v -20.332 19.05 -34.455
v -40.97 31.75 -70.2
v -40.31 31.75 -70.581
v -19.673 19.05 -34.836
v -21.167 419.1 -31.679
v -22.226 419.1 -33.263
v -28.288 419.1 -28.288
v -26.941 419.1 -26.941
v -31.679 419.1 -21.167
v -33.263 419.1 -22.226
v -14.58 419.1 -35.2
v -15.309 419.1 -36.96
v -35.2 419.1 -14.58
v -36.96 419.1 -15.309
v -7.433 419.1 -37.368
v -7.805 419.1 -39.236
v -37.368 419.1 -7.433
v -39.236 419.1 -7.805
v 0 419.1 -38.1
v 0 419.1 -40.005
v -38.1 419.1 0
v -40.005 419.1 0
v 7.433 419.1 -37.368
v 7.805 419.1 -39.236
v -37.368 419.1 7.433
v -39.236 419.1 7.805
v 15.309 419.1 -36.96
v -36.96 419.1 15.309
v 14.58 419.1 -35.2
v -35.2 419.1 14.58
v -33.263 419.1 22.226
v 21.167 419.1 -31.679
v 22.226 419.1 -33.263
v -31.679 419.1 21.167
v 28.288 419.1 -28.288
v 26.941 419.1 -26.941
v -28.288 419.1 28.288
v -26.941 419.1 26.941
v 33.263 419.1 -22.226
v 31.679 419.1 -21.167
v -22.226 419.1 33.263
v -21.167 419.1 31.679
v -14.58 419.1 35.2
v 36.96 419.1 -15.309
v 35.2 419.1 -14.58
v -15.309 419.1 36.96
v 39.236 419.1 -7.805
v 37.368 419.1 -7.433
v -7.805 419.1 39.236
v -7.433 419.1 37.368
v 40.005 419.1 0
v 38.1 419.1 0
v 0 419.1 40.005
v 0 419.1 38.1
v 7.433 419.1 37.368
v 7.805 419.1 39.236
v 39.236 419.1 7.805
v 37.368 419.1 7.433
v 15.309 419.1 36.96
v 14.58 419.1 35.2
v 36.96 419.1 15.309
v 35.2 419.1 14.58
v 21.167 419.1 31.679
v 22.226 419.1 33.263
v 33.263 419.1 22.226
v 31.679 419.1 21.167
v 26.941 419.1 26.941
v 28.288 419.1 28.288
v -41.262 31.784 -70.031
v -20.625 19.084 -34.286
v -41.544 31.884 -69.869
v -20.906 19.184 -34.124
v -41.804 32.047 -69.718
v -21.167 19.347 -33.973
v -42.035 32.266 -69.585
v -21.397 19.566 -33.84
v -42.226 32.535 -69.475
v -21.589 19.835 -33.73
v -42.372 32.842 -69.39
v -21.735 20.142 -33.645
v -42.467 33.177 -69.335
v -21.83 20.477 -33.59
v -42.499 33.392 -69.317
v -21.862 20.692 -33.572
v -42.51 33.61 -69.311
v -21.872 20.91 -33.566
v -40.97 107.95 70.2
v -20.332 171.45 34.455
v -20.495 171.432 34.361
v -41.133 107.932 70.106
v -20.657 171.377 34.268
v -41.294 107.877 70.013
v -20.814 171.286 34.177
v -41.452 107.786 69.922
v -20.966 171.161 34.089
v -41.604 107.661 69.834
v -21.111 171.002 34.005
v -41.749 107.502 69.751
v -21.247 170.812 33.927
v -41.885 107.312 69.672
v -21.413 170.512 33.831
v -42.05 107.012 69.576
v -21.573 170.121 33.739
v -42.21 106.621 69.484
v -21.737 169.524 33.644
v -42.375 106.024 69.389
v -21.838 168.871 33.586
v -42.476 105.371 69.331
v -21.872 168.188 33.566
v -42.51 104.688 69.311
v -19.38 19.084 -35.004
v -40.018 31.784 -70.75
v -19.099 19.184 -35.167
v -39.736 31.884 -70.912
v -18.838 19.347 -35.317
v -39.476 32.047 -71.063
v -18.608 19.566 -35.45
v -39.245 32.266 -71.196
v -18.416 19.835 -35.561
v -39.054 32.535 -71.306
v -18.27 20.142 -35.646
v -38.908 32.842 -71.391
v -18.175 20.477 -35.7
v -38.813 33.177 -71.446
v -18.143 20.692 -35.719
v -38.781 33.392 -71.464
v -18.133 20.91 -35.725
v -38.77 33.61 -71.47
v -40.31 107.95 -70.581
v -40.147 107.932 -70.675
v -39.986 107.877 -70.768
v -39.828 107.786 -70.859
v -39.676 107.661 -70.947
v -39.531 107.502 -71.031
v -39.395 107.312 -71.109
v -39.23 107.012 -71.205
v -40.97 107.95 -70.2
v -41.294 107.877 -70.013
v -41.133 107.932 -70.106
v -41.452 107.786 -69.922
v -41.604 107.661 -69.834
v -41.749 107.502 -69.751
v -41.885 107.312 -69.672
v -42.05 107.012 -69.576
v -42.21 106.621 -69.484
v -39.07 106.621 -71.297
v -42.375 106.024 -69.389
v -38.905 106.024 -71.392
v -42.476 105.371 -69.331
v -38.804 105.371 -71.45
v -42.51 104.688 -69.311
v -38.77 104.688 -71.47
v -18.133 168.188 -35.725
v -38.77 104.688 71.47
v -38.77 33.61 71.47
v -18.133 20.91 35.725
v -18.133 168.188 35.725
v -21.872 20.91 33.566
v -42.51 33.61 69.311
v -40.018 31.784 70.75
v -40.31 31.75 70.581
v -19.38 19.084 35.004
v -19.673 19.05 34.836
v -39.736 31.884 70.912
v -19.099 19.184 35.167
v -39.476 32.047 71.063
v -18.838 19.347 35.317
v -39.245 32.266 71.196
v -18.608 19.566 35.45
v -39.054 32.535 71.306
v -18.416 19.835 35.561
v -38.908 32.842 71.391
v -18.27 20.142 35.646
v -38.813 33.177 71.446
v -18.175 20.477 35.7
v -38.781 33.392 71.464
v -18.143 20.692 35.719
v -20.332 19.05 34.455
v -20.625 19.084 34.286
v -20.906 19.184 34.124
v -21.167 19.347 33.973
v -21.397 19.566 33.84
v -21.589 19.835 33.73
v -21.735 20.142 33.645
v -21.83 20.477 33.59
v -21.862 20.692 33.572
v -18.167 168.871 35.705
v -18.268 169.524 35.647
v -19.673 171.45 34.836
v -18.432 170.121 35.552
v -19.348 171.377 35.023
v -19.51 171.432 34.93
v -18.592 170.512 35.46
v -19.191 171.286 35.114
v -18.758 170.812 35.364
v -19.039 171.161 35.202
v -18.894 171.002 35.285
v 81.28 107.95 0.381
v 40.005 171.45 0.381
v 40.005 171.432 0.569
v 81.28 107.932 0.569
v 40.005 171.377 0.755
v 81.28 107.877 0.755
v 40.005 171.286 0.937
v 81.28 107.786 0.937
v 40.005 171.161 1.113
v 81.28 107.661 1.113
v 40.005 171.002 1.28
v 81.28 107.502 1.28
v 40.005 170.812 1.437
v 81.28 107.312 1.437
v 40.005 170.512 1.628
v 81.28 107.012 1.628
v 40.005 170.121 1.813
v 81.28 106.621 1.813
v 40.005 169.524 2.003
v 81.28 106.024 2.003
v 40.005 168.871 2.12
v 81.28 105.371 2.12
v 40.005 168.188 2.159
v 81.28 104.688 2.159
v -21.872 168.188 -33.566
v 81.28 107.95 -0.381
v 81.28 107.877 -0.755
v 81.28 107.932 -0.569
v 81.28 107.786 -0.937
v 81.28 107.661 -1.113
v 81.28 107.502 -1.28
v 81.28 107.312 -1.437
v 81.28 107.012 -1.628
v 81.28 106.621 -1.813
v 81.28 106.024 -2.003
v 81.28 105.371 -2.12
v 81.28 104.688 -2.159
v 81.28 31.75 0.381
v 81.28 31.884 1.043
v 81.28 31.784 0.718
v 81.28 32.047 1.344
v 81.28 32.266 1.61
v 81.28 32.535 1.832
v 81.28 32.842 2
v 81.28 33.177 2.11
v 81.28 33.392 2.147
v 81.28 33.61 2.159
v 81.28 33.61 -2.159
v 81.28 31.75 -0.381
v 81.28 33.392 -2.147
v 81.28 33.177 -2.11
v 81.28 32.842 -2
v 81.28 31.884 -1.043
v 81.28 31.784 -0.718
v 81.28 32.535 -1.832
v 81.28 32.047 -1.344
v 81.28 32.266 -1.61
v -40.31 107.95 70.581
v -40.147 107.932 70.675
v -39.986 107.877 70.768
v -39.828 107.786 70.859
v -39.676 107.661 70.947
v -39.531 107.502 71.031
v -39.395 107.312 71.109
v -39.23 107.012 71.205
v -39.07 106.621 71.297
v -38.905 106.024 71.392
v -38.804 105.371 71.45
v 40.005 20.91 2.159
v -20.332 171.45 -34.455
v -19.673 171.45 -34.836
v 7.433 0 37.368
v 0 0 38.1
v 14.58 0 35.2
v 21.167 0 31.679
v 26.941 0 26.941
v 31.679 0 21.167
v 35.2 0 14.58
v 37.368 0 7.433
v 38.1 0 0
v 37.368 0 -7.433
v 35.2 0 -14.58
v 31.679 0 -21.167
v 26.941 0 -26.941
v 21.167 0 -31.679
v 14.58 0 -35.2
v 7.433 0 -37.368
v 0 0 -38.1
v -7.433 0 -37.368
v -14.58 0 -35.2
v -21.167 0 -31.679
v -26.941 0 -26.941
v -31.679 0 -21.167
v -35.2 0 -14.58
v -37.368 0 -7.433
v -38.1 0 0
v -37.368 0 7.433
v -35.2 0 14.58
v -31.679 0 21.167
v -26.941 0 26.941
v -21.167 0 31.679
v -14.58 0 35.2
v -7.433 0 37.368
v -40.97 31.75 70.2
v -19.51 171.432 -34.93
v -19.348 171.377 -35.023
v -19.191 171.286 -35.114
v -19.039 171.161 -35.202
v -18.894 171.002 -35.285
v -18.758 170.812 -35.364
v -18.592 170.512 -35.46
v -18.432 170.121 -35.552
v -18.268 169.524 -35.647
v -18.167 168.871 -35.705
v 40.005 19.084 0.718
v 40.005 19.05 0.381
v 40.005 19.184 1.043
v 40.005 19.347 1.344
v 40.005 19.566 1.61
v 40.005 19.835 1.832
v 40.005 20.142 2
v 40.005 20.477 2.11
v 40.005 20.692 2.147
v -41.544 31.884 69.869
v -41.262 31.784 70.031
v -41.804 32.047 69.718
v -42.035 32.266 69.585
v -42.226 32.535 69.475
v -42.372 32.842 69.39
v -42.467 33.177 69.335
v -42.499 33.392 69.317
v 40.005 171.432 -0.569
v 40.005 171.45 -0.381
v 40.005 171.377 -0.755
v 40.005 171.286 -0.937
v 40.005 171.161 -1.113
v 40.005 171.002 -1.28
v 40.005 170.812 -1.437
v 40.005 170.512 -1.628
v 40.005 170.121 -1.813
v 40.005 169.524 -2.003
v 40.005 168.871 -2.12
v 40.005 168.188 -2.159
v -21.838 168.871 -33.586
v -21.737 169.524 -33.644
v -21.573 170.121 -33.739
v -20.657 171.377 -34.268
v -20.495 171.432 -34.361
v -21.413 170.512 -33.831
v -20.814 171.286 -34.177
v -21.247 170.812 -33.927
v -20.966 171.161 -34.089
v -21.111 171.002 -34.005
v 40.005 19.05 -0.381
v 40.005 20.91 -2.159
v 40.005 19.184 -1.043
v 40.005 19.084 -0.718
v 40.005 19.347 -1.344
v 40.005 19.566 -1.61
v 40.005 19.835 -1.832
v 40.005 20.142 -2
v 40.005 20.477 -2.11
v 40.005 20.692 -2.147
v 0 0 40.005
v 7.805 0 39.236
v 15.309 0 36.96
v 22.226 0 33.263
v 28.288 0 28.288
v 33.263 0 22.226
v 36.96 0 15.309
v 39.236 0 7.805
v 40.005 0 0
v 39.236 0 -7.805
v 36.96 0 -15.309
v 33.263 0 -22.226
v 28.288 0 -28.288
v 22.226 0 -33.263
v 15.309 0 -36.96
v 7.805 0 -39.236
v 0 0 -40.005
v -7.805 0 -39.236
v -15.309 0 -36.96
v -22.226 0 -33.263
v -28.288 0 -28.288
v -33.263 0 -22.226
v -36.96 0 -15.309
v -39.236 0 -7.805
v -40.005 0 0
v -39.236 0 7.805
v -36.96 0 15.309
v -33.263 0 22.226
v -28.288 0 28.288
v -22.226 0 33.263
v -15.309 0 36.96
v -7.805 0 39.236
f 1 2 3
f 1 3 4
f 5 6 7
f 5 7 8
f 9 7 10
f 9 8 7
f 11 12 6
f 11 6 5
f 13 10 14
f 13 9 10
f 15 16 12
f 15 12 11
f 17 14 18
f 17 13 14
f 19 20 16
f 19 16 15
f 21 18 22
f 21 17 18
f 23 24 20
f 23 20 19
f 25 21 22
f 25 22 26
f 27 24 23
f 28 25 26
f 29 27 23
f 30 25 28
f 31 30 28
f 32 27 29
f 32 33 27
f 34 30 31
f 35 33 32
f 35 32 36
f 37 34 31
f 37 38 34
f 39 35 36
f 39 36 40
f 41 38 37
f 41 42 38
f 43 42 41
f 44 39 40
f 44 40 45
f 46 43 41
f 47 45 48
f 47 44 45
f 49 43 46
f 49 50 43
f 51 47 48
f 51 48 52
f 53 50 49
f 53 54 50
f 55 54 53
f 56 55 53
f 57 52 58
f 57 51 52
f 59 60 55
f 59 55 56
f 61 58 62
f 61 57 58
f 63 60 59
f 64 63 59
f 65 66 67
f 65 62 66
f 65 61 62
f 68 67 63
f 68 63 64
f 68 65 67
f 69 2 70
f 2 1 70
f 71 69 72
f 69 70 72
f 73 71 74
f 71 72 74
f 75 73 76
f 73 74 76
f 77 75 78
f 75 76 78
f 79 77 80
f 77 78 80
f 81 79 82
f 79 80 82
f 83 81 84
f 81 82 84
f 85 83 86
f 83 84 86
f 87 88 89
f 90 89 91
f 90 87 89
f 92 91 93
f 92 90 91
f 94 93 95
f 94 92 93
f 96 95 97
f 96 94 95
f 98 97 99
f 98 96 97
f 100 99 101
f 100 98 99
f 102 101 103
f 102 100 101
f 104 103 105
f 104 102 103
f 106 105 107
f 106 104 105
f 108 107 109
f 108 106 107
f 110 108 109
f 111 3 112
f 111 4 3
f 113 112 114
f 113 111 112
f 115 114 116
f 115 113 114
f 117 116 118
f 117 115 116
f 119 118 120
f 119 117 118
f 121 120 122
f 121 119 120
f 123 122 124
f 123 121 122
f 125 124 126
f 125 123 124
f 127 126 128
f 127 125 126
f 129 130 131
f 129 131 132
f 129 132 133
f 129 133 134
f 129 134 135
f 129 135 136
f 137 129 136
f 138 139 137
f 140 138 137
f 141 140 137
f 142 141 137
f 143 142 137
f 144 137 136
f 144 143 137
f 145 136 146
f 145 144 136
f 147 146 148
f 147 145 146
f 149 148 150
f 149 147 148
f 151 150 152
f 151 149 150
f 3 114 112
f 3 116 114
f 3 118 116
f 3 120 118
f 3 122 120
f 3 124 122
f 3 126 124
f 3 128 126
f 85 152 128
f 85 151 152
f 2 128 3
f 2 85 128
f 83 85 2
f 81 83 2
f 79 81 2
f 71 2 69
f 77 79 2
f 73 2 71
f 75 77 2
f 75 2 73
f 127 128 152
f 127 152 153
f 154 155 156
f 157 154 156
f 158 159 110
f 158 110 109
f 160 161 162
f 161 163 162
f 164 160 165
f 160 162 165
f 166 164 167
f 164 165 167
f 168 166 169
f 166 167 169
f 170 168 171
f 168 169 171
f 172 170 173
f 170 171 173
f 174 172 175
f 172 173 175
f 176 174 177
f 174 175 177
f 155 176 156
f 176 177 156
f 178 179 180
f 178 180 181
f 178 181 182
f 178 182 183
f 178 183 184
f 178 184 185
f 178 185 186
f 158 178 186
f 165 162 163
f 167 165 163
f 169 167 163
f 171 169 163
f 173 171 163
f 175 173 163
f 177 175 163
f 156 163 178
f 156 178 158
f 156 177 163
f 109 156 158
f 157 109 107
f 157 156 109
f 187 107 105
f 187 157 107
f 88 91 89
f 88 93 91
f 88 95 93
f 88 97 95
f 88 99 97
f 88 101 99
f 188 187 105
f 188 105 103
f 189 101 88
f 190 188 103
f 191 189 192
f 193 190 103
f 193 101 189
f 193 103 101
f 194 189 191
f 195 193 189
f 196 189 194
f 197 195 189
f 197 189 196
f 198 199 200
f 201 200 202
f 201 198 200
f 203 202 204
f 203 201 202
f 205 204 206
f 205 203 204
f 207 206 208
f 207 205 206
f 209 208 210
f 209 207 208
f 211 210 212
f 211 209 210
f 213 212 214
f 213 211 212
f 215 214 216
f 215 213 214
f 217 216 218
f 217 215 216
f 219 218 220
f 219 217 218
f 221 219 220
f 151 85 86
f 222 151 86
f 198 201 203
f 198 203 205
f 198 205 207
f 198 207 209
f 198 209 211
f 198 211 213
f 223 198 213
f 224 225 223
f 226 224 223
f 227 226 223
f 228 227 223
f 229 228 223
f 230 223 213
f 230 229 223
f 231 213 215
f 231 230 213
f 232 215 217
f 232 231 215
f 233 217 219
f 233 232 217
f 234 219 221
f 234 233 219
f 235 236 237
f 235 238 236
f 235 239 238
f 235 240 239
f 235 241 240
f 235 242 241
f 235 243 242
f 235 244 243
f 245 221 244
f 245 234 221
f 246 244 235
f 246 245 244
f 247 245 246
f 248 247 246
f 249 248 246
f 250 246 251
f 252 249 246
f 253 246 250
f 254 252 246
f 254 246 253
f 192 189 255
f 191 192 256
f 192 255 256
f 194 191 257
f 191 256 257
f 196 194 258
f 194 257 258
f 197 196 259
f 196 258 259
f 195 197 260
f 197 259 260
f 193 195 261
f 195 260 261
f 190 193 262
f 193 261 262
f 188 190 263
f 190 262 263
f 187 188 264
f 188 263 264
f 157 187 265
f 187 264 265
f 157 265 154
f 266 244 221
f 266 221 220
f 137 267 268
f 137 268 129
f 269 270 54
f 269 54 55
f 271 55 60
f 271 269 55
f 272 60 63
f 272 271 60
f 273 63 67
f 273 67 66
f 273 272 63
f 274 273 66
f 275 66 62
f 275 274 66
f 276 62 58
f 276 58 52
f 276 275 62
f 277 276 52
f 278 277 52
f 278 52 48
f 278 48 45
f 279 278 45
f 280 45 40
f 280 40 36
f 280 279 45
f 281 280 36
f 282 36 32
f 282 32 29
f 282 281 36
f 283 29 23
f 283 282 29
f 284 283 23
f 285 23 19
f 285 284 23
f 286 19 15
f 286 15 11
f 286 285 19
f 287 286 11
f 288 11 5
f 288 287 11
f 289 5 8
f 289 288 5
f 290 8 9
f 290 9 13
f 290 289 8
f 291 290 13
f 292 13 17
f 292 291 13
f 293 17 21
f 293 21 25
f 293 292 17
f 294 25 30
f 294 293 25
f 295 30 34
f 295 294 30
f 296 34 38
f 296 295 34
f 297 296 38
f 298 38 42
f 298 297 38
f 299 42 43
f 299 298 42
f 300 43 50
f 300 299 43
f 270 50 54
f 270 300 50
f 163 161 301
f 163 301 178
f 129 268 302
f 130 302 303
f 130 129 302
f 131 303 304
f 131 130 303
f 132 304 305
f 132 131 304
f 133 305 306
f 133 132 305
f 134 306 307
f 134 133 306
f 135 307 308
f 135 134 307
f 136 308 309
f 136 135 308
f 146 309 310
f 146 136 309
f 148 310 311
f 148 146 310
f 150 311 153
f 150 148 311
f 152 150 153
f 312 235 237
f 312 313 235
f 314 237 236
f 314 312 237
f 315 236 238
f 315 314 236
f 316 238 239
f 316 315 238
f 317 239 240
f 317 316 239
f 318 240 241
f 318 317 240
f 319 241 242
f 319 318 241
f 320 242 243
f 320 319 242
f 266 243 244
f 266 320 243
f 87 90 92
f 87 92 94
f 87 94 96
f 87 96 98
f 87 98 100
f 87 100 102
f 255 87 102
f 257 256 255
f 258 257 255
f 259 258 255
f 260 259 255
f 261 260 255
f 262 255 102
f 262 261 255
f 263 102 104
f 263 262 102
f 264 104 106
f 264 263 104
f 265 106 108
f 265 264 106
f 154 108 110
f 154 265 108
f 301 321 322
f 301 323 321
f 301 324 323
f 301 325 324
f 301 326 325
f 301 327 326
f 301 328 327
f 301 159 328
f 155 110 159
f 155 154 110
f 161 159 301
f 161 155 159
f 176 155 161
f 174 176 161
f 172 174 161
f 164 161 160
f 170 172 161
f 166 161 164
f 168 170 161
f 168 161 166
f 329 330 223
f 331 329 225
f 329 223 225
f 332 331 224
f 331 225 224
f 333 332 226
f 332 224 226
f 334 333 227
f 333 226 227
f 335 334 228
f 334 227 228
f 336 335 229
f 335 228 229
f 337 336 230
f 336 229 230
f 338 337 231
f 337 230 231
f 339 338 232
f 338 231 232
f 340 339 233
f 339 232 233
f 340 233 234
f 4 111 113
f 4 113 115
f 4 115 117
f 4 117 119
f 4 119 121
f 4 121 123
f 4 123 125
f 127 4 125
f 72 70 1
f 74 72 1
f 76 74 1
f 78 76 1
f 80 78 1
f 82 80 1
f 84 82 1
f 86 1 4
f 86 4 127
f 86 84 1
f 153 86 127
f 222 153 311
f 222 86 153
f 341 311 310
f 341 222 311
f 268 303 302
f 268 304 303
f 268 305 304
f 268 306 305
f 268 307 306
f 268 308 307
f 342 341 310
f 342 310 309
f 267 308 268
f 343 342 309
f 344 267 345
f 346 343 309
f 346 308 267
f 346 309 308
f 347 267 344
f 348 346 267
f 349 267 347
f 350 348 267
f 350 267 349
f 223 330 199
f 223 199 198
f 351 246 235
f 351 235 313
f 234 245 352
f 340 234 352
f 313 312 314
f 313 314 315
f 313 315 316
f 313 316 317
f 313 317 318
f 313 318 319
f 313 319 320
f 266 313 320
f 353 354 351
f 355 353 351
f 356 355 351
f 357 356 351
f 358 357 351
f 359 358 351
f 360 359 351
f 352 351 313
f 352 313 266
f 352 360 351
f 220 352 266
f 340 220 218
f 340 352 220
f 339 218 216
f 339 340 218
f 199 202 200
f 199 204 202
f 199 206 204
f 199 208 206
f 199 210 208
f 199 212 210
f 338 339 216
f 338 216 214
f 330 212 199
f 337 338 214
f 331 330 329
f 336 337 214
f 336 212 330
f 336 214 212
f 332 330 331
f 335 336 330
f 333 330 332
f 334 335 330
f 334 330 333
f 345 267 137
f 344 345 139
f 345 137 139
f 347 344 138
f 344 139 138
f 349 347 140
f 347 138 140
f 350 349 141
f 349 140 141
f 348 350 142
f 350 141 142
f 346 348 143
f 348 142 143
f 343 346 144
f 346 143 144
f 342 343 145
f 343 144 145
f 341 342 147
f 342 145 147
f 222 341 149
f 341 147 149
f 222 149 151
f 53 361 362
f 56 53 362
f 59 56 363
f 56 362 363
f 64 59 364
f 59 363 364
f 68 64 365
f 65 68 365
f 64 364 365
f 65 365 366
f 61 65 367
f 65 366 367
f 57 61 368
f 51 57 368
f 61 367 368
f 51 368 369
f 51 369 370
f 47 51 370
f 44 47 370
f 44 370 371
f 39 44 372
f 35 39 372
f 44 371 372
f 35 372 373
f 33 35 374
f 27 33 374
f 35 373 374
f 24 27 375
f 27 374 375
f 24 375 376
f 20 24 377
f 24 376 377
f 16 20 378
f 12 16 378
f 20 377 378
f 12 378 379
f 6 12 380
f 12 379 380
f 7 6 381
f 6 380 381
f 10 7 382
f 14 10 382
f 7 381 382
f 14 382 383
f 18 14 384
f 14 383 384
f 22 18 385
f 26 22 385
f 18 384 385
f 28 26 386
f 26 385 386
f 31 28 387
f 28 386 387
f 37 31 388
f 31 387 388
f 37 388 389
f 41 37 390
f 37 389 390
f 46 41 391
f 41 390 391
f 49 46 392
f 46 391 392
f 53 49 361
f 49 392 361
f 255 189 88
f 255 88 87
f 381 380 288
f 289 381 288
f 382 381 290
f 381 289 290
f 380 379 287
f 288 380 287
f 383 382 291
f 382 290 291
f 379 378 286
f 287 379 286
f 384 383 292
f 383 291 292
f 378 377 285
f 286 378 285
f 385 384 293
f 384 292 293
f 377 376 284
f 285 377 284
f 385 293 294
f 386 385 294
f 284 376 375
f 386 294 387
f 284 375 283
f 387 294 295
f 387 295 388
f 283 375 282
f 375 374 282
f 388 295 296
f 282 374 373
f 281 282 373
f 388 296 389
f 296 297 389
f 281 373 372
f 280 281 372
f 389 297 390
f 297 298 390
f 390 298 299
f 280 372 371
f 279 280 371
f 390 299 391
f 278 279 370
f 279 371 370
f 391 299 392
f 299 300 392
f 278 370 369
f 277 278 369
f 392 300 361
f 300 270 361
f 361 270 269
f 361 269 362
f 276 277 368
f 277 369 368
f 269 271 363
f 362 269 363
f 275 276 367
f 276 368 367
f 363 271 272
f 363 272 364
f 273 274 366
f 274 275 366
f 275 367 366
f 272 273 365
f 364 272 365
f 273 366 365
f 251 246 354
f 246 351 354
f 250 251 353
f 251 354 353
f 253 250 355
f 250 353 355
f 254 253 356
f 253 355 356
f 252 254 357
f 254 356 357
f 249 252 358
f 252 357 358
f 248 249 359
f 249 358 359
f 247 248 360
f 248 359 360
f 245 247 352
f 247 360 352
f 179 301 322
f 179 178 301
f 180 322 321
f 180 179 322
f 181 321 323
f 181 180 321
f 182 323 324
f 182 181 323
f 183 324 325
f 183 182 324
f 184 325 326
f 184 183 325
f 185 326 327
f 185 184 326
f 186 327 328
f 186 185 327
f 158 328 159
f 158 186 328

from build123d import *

# Parameters (mm, degrees)
SKETCH3_R                = 40.005
SKETCH3_R_2              = 38.1
BOSS_EXTRUDE1_DEPTH      = 419.1
BOSS_EXTRUDE2_DEPTH      = 2.159
BOSS_EXTRUDE2_DEPTH_BACK = 2.159
FILLET1_R                = 1.778
CIRPATTERN1_COUNT        = 3


with BuildPart() as part:
    # Sketch3 → Boss-Extrude1 (new body)
    with BuildSketch(Plane(origin=(0, 0, 0), x_dir=(1, 0, 0), z_dir=(0, 1, 0))):
        with Locations(Location((0, 0, 0), (0, 0, 270))):
            Circle(SKETCH3_R)
        with Locations(Location((0, 0, 0), (0, 0, 270))):
            Circle(SKETCH3_R_2, mode=Mode.SUBTRACT)
    extrude(amount=BOSS_EXTRUDE1_DEPTH)


with BuildPart() as body_2:
    # Sketch4 → Boss-Extrude2 (new, two sides: drawn at the far end of the back side and taken through both)
    with BuildSketch(Plane.XY.offset(-BOSS_EXTRUDE2_DEPTH_BACK)):
        Polygon((40.005, 19.05), (40.005, 171.45), (81.28, 107.95), (81.28, 31.75), align=None)
    extrude(amount=BOSS_EXTRUDE2_DEPTH + BOSS_EXTRUDE2_DEPTH_BACK)

    # Fillet1
    fillet1_edges = [body_2.edges().sort_by_distance(p)[0] for p in [
        (60.6425, 25.4, 2.159),
        (60.6425, 139.7, -2.159),
        (60.6425, 139.7, 2.159),
        (60.6425, 25.4, -2.159),
    ]]
    fillet(fillet1_edges, radius=FILLET1_R)


with BuildPart() as cirpattern1_1:
    # CirPattern1: pattern copy
    add(body_2.part.rotate(Axis((0, 0, 0), (0, 1, 0)), 1 * 360 / CIRPATTERN1_COUNT))


with BuildPart() as cirpattern1_2:
    # CirPattern1: pattern copy
    add(body_2.part.rotate(Axis((0, 0, 0), (0, 1, 0)), 2 * 360 / CIRPATTERN1_COUNT))


solid = Compound([part.part, body_2.part, cirpattern1_1.part, cirpattern1_2.part])
